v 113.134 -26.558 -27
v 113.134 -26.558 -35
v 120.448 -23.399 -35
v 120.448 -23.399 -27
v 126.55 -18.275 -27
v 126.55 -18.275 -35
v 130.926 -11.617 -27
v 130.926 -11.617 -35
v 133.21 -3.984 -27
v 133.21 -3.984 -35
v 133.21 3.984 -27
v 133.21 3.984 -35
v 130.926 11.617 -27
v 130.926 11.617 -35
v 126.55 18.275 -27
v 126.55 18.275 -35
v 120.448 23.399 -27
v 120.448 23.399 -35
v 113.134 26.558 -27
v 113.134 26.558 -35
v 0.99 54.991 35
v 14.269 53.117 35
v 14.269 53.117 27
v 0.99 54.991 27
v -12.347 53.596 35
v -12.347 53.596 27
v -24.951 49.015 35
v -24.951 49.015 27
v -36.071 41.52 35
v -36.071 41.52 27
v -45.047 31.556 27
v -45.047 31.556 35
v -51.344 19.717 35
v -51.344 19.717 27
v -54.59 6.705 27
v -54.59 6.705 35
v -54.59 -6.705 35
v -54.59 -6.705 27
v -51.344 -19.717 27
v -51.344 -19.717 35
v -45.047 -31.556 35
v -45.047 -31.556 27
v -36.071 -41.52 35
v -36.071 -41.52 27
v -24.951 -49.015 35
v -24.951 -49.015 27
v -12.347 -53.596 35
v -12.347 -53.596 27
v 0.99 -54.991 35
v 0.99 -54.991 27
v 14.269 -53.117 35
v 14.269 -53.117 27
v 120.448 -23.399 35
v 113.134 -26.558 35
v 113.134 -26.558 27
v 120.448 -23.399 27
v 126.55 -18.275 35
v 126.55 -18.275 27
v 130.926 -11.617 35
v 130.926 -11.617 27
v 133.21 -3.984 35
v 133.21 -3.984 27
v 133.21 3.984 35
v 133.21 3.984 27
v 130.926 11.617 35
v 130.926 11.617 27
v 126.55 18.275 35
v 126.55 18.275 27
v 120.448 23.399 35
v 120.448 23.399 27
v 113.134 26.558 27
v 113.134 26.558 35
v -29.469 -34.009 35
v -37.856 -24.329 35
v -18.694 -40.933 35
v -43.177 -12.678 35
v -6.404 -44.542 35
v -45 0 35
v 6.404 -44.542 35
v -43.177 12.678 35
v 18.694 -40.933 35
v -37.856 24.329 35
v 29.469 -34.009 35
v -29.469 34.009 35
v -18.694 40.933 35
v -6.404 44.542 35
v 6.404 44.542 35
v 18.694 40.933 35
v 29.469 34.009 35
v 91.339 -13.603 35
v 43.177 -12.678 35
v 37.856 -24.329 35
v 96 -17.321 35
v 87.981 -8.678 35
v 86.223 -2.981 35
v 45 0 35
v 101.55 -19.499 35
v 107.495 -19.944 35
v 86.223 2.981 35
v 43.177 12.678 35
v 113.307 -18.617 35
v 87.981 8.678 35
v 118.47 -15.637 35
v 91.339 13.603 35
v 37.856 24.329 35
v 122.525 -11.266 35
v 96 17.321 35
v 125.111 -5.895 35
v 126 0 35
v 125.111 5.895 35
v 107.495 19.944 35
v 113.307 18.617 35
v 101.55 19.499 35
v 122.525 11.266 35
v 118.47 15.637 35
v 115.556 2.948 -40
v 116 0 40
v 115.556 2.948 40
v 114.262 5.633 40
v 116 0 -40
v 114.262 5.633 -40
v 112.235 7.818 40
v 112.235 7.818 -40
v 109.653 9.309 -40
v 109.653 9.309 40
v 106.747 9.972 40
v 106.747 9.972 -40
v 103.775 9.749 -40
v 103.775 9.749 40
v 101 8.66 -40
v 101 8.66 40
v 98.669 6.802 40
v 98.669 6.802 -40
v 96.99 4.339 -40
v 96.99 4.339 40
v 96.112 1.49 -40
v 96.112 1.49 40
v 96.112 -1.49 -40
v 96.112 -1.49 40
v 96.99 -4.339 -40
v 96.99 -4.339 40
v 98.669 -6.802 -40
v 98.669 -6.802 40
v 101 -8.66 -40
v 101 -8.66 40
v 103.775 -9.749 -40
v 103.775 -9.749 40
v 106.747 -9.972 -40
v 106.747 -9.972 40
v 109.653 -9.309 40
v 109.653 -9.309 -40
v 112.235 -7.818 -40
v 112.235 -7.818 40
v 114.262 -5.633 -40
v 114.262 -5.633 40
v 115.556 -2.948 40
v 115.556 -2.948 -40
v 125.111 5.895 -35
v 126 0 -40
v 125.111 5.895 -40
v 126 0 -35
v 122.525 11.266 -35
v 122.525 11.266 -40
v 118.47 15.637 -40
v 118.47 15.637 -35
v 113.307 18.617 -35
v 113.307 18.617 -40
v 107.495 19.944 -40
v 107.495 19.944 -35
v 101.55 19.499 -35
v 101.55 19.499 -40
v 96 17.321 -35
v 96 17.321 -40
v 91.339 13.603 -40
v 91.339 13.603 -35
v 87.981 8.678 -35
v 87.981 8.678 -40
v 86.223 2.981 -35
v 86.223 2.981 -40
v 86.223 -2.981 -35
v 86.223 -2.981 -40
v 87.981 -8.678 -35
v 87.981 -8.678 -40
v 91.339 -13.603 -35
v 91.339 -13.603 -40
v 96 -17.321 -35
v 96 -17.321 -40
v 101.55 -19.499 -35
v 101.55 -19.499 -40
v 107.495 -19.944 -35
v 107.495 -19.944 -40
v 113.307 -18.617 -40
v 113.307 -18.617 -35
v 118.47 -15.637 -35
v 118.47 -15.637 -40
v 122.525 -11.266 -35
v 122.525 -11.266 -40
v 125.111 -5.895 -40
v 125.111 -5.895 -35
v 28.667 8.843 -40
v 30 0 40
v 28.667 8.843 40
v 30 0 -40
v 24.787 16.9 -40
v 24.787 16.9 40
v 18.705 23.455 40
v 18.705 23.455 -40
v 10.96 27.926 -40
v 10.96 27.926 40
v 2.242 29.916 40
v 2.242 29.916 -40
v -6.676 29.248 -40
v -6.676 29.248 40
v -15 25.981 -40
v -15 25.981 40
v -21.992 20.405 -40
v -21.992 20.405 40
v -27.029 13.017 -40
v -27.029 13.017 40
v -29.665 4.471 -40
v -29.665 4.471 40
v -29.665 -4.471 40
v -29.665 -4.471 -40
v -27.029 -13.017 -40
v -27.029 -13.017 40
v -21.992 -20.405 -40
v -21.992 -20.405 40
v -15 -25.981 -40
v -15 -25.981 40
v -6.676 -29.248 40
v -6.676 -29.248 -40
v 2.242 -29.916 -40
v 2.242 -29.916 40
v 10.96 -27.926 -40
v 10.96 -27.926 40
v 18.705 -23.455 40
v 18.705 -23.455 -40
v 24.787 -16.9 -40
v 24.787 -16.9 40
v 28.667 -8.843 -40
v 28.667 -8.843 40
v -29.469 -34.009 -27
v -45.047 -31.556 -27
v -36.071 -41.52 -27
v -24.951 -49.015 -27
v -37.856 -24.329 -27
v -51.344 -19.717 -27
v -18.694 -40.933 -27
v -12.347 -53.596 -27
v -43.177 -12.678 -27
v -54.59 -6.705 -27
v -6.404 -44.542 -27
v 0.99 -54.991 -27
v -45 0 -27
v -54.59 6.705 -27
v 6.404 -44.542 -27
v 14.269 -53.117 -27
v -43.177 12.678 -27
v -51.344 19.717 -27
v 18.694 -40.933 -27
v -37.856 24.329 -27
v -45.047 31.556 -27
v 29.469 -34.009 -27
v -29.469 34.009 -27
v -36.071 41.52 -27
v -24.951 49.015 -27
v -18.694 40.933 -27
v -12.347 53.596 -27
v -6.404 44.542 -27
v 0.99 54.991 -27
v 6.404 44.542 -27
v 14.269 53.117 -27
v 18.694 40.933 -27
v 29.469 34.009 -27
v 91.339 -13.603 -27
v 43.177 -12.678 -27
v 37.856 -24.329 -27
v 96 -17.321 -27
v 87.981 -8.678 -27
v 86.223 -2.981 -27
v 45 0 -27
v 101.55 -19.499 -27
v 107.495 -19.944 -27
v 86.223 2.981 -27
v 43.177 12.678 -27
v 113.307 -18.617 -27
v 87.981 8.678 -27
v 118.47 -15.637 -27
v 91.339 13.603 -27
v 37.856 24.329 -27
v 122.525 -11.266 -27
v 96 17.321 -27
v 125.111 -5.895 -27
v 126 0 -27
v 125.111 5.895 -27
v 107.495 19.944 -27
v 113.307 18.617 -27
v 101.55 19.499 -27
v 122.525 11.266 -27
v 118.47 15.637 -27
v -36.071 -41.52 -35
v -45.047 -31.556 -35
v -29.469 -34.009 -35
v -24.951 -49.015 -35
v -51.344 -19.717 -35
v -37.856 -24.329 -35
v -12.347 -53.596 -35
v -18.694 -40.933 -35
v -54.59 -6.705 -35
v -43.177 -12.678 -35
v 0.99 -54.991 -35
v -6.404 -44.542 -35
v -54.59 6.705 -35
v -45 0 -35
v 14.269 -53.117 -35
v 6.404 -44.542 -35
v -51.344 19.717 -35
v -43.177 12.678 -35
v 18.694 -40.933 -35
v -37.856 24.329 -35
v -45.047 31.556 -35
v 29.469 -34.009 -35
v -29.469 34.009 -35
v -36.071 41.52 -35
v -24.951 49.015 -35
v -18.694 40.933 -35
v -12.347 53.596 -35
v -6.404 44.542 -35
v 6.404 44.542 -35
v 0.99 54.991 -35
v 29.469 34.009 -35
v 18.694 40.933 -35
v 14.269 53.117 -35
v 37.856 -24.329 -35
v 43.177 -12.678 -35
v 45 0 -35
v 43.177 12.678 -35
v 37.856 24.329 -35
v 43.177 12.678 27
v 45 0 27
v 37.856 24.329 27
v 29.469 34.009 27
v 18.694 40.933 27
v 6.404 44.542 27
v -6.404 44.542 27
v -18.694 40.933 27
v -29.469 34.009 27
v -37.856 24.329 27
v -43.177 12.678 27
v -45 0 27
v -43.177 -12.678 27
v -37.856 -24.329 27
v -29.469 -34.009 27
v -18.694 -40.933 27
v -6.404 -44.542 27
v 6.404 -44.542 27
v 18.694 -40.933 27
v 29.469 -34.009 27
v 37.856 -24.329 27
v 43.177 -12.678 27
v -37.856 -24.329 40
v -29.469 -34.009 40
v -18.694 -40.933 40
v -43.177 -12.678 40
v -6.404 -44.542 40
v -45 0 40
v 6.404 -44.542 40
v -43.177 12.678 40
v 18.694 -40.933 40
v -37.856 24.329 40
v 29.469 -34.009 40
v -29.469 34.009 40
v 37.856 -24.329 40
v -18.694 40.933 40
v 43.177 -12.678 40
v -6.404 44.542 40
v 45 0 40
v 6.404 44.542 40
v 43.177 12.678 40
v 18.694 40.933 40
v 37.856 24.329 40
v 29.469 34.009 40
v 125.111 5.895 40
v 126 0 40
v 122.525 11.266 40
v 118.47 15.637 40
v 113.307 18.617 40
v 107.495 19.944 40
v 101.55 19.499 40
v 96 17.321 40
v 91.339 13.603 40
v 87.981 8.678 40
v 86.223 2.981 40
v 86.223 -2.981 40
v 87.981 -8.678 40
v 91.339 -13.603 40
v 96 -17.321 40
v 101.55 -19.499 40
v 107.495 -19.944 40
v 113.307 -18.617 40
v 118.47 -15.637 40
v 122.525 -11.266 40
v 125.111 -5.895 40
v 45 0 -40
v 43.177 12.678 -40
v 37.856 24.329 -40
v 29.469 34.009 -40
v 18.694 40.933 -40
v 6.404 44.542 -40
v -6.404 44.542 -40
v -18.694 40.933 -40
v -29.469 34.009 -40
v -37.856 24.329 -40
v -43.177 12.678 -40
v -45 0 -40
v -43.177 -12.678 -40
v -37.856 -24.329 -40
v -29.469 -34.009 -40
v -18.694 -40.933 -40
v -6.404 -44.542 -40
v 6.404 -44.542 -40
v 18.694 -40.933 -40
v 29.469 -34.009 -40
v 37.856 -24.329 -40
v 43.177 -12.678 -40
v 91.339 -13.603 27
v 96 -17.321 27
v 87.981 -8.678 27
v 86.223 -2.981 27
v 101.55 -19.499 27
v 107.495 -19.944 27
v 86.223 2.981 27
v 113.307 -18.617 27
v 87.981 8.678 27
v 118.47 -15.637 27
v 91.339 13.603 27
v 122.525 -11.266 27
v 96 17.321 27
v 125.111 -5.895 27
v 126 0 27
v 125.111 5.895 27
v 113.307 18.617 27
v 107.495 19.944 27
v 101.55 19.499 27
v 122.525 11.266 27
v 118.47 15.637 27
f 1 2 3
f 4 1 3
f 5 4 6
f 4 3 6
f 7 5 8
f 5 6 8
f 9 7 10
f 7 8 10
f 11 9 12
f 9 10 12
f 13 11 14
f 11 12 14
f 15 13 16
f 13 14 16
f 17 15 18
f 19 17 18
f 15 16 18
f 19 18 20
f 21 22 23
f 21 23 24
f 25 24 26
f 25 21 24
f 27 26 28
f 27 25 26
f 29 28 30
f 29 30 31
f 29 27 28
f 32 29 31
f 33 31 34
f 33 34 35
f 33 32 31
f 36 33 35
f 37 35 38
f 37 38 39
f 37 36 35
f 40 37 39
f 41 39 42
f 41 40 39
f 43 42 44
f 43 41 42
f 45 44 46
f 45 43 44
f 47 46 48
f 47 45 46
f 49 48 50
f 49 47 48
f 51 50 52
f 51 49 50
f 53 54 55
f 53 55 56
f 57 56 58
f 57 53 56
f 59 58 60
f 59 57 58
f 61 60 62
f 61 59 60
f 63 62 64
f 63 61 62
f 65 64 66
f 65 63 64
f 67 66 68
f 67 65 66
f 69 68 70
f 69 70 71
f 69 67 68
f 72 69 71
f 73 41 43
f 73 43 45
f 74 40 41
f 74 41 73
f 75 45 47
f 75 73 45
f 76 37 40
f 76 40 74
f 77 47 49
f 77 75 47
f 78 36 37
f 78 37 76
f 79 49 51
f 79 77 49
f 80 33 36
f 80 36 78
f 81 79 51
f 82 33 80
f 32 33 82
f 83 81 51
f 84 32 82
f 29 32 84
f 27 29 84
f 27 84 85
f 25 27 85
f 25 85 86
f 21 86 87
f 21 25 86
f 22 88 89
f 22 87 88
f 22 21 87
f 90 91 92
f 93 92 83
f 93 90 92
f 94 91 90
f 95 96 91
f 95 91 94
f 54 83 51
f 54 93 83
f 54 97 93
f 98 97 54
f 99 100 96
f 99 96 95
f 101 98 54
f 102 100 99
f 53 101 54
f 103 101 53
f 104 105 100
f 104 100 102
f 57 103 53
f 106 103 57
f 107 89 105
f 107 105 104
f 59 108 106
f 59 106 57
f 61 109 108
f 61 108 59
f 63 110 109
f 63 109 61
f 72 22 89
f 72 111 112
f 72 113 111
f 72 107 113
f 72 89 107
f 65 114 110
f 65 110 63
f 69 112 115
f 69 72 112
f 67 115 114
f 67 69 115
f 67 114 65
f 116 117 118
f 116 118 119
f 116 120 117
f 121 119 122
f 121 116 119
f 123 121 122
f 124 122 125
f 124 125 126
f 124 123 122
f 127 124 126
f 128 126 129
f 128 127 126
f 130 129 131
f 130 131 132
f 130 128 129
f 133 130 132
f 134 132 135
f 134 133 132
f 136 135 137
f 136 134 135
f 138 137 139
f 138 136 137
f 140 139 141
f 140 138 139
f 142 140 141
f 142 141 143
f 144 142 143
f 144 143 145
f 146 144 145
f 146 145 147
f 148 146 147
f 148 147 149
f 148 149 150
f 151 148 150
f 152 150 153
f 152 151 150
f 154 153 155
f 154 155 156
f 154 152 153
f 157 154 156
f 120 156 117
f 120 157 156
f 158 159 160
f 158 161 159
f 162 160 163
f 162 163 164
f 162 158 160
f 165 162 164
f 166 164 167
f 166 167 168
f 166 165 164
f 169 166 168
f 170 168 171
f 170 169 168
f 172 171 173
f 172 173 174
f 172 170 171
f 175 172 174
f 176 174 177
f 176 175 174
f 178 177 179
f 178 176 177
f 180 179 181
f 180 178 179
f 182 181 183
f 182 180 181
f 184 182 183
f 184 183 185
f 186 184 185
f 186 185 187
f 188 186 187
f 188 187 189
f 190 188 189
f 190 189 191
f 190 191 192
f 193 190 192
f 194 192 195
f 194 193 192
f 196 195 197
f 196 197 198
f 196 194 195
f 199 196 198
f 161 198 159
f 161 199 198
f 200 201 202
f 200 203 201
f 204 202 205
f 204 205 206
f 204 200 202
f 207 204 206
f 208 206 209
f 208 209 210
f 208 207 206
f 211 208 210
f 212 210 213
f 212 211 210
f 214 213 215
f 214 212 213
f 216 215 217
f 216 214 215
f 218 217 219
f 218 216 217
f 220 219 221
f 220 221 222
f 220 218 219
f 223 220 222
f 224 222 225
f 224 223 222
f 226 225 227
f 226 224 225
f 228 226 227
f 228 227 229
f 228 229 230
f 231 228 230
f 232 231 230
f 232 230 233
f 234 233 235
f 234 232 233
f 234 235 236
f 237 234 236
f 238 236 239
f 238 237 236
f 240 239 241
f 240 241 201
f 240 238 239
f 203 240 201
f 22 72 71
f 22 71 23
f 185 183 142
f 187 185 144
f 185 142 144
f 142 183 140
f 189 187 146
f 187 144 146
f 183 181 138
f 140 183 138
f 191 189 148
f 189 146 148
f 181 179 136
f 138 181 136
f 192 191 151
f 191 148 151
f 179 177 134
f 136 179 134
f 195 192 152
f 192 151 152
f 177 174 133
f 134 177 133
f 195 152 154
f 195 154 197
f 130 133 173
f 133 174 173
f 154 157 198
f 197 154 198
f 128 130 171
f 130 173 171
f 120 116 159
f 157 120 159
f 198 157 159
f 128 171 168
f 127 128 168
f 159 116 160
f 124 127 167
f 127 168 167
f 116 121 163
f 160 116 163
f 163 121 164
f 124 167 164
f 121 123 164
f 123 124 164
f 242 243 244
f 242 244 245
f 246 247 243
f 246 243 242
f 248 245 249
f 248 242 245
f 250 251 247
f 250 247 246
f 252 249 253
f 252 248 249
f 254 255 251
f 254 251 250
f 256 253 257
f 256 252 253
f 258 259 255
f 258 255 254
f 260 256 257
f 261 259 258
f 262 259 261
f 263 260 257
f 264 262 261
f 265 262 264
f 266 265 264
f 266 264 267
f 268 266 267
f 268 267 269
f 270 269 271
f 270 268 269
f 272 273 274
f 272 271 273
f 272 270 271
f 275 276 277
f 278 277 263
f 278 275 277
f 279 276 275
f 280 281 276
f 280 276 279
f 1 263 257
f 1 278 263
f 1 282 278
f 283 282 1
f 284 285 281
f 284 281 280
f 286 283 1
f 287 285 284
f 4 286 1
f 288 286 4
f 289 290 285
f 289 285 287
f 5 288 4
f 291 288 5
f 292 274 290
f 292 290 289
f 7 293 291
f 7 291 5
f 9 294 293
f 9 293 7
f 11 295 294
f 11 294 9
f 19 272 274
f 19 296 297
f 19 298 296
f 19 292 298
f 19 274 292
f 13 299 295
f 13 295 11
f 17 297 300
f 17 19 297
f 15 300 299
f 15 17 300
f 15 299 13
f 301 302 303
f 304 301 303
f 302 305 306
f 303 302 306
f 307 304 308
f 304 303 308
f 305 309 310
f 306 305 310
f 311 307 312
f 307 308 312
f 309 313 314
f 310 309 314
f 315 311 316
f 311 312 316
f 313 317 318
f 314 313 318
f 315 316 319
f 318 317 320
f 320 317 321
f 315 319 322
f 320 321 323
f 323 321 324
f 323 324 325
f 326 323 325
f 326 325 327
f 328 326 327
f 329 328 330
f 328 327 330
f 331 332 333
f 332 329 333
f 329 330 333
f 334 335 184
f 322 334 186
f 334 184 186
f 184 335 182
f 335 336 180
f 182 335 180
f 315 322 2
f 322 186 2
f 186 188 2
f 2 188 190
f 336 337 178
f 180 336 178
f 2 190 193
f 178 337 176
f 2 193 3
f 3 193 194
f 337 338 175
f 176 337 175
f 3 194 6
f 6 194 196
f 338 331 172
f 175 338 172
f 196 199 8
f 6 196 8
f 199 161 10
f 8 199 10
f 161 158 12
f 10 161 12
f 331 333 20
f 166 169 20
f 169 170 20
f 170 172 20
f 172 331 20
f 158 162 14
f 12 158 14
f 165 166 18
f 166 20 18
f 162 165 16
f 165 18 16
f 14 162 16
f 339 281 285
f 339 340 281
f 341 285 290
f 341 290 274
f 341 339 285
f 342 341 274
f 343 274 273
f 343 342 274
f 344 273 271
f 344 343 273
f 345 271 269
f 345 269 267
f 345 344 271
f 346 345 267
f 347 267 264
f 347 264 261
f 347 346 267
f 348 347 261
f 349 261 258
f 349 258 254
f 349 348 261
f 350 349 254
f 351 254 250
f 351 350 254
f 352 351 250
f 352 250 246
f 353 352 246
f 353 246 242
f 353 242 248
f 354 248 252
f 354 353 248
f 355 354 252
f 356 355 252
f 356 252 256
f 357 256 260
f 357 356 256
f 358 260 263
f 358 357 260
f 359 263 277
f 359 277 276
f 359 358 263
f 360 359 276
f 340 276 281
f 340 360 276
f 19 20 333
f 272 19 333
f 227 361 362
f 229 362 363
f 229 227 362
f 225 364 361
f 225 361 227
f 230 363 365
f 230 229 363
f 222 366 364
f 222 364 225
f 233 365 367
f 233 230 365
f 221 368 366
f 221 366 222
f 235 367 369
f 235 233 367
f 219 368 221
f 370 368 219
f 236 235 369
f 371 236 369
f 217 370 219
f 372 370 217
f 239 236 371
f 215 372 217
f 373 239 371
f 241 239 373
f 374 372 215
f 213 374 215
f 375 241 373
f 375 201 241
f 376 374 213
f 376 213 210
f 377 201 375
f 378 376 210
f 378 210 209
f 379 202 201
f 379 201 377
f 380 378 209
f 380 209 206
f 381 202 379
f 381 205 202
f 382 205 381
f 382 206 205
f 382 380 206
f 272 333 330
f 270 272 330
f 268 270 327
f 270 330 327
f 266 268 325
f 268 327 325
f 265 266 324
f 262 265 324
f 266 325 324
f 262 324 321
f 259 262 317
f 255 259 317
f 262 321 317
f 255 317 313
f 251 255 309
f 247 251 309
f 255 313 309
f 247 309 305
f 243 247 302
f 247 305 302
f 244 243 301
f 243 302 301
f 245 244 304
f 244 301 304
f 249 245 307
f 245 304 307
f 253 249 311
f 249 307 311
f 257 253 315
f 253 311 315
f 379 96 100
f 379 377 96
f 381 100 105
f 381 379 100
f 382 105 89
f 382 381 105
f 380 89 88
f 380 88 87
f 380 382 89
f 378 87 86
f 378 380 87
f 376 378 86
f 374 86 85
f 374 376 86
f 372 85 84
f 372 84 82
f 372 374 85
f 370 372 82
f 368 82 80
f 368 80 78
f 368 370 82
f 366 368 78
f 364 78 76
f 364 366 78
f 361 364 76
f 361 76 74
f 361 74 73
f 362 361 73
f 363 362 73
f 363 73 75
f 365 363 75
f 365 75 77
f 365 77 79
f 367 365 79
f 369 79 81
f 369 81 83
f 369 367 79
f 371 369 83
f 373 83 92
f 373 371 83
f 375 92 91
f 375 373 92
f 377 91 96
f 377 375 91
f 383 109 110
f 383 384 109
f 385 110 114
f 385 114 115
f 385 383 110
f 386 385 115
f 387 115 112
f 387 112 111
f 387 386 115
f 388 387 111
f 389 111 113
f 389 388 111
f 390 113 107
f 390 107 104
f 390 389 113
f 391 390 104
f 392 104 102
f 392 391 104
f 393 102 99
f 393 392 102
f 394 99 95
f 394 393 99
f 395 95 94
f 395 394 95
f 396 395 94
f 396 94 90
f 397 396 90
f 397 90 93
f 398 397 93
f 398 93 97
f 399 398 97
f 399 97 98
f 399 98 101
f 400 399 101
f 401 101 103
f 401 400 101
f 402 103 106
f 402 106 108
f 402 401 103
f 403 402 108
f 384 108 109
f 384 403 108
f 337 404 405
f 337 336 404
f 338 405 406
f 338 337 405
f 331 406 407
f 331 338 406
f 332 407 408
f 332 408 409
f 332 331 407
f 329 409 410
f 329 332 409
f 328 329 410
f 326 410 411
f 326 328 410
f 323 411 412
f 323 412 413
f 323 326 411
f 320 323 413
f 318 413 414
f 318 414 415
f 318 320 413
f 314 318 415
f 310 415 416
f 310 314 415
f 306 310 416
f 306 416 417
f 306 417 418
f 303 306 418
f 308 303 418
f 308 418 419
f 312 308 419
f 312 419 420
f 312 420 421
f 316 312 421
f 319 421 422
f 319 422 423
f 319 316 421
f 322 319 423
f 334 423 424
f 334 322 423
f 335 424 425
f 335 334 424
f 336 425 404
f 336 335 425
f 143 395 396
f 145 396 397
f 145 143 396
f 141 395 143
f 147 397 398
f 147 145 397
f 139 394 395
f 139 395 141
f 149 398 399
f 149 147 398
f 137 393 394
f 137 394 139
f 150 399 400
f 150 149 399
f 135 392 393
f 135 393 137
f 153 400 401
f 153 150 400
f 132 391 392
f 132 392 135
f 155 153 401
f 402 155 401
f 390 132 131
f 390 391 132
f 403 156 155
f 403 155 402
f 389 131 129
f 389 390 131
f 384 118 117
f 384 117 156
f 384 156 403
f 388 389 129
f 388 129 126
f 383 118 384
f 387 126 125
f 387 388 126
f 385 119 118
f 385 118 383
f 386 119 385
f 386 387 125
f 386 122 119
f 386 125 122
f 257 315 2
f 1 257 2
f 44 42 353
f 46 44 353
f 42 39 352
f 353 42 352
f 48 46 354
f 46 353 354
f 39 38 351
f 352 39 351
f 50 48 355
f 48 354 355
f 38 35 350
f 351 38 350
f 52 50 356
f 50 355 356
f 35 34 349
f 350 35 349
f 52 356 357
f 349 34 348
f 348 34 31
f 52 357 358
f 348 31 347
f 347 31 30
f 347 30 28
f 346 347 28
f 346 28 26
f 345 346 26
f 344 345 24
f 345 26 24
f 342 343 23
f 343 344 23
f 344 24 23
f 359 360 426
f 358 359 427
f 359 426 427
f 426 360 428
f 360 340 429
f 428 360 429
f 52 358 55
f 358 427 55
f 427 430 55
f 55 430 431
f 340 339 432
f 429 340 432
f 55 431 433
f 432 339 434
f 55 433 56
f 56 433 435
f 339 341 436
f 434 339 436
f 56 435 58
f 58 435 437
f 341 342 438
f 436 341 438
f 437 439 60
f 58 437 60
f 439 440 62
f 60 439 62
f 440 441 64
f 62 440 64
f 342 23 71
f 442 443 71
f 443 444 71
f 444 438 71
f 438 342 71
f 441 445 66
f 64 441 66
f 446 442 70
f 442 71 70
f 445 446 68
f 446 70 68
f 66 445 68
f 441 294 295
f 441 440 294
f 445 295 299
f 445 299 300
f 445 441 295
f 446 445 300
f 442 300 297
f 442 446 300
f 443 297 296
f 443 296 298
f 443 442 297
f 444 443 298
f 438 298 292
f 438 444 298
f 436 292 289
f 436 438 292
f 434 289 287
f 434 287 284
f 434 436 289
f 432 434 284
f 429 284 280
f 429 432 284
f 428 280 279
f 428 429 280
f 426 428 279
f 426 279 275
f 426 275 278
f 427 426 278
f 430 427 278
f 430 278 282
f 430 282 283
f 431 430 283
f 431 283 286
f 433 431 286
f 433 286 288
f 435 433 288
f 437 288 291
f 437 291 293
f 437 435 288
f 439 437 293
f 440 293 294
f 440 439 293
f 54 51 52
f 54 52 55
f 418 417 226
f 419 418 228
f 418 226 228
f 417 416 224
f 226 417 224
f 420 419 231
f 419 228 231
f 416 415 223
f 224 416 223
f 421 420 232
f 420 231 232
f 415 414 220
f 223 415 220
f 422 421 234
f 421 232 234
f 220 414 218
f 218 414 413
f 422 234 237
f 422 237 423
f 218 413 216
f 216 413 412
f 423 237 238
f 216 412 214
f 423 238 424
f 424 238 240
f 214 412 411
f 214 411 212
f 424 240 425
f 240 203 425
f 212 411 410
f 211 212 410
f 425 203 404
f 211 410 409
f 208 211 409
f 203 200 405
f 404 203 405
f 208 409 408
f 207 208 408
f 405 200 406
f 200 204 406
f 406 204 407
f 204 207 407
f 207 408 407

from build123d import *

# Parameters (mm, degrees)
SKETCH_1_R        = 45
SKETCH_1_R_2      = 30
EXTRUDE_5_DEPTH   = 40
SKETCH_1_R_3      = 20
SKETCH_1_R_4      = 10
EXTRUDE_5_2_DEPTH = 40
EXTRUDE_START     = 35
SKETCH_1_7_R      = 45
SKETCH_1_7_R_2    = 20
EXTRUDE_6_DEPTH   = 8


with BuildPart() as part:
    # 草图1 → 凸台-拉伸5 (new, symmetric)
    with BuildSketch(Plane.XY):
        Circle(SKETCH_1_R)
        Circle(SKETCH_1_R_2, mode=Mode.SUBTRACT)
    extrude(amount=EXTRUDE_5_DEPTH, both=True)



with BuildPart() as body_2:
    # 草图1 → Extrude 5 2 (new, symmetric)
    with BuildSketch(Plane.XY):
        with Locations((106, 0)):
            Circle(SKETCH_1_R_3)
        with Locations((106, 0)):
            Circle(SKETCH_1_R_4, mode=Mode.SUBTRACT)
    extrude(amount=EXTRUDE_5_2_DEPTH, both=True)


with BuildPart() as part_1:
    add(part.part)

    add(body_2.part)  # 凸台-拉伸6 merges body 2
    # 草图1<7> → 凸台-拉伸6 (add)
    with BuildSketch(Plane.XY.offset(EXTRUDE_START)):
        with BuildLine():
            Line((113.134433962, 26.558423373), (14.268867925, 53.116846745))
            ThreePointArc((14.268867925, 53.116846745), (-55, 0), (14.268867925, -53.116846745))
            Line((14.268867925, -53.116846745), (113.134433962, -26.558423373))
            ThreePointArc((113.134433962, -26.558423373), (133.5, 0), (113.134433962, 26.558423373))
        make_face()
        Circle(SKETCH_1_7_R, mode=Mode.SUBTRACT)
        with Locations((106, 0)):
            Circle(SKETCH_1_7_R_2, mode=Mode.SUBTRACT)
    extrude_6 = extrude(amount=-EXTRUDE_6_DEPTH)

    # 镜向2: 凸台-拉伸6 across plane
    add(extrude_6.mirror(Plane.XY))


solid = part_1.part
